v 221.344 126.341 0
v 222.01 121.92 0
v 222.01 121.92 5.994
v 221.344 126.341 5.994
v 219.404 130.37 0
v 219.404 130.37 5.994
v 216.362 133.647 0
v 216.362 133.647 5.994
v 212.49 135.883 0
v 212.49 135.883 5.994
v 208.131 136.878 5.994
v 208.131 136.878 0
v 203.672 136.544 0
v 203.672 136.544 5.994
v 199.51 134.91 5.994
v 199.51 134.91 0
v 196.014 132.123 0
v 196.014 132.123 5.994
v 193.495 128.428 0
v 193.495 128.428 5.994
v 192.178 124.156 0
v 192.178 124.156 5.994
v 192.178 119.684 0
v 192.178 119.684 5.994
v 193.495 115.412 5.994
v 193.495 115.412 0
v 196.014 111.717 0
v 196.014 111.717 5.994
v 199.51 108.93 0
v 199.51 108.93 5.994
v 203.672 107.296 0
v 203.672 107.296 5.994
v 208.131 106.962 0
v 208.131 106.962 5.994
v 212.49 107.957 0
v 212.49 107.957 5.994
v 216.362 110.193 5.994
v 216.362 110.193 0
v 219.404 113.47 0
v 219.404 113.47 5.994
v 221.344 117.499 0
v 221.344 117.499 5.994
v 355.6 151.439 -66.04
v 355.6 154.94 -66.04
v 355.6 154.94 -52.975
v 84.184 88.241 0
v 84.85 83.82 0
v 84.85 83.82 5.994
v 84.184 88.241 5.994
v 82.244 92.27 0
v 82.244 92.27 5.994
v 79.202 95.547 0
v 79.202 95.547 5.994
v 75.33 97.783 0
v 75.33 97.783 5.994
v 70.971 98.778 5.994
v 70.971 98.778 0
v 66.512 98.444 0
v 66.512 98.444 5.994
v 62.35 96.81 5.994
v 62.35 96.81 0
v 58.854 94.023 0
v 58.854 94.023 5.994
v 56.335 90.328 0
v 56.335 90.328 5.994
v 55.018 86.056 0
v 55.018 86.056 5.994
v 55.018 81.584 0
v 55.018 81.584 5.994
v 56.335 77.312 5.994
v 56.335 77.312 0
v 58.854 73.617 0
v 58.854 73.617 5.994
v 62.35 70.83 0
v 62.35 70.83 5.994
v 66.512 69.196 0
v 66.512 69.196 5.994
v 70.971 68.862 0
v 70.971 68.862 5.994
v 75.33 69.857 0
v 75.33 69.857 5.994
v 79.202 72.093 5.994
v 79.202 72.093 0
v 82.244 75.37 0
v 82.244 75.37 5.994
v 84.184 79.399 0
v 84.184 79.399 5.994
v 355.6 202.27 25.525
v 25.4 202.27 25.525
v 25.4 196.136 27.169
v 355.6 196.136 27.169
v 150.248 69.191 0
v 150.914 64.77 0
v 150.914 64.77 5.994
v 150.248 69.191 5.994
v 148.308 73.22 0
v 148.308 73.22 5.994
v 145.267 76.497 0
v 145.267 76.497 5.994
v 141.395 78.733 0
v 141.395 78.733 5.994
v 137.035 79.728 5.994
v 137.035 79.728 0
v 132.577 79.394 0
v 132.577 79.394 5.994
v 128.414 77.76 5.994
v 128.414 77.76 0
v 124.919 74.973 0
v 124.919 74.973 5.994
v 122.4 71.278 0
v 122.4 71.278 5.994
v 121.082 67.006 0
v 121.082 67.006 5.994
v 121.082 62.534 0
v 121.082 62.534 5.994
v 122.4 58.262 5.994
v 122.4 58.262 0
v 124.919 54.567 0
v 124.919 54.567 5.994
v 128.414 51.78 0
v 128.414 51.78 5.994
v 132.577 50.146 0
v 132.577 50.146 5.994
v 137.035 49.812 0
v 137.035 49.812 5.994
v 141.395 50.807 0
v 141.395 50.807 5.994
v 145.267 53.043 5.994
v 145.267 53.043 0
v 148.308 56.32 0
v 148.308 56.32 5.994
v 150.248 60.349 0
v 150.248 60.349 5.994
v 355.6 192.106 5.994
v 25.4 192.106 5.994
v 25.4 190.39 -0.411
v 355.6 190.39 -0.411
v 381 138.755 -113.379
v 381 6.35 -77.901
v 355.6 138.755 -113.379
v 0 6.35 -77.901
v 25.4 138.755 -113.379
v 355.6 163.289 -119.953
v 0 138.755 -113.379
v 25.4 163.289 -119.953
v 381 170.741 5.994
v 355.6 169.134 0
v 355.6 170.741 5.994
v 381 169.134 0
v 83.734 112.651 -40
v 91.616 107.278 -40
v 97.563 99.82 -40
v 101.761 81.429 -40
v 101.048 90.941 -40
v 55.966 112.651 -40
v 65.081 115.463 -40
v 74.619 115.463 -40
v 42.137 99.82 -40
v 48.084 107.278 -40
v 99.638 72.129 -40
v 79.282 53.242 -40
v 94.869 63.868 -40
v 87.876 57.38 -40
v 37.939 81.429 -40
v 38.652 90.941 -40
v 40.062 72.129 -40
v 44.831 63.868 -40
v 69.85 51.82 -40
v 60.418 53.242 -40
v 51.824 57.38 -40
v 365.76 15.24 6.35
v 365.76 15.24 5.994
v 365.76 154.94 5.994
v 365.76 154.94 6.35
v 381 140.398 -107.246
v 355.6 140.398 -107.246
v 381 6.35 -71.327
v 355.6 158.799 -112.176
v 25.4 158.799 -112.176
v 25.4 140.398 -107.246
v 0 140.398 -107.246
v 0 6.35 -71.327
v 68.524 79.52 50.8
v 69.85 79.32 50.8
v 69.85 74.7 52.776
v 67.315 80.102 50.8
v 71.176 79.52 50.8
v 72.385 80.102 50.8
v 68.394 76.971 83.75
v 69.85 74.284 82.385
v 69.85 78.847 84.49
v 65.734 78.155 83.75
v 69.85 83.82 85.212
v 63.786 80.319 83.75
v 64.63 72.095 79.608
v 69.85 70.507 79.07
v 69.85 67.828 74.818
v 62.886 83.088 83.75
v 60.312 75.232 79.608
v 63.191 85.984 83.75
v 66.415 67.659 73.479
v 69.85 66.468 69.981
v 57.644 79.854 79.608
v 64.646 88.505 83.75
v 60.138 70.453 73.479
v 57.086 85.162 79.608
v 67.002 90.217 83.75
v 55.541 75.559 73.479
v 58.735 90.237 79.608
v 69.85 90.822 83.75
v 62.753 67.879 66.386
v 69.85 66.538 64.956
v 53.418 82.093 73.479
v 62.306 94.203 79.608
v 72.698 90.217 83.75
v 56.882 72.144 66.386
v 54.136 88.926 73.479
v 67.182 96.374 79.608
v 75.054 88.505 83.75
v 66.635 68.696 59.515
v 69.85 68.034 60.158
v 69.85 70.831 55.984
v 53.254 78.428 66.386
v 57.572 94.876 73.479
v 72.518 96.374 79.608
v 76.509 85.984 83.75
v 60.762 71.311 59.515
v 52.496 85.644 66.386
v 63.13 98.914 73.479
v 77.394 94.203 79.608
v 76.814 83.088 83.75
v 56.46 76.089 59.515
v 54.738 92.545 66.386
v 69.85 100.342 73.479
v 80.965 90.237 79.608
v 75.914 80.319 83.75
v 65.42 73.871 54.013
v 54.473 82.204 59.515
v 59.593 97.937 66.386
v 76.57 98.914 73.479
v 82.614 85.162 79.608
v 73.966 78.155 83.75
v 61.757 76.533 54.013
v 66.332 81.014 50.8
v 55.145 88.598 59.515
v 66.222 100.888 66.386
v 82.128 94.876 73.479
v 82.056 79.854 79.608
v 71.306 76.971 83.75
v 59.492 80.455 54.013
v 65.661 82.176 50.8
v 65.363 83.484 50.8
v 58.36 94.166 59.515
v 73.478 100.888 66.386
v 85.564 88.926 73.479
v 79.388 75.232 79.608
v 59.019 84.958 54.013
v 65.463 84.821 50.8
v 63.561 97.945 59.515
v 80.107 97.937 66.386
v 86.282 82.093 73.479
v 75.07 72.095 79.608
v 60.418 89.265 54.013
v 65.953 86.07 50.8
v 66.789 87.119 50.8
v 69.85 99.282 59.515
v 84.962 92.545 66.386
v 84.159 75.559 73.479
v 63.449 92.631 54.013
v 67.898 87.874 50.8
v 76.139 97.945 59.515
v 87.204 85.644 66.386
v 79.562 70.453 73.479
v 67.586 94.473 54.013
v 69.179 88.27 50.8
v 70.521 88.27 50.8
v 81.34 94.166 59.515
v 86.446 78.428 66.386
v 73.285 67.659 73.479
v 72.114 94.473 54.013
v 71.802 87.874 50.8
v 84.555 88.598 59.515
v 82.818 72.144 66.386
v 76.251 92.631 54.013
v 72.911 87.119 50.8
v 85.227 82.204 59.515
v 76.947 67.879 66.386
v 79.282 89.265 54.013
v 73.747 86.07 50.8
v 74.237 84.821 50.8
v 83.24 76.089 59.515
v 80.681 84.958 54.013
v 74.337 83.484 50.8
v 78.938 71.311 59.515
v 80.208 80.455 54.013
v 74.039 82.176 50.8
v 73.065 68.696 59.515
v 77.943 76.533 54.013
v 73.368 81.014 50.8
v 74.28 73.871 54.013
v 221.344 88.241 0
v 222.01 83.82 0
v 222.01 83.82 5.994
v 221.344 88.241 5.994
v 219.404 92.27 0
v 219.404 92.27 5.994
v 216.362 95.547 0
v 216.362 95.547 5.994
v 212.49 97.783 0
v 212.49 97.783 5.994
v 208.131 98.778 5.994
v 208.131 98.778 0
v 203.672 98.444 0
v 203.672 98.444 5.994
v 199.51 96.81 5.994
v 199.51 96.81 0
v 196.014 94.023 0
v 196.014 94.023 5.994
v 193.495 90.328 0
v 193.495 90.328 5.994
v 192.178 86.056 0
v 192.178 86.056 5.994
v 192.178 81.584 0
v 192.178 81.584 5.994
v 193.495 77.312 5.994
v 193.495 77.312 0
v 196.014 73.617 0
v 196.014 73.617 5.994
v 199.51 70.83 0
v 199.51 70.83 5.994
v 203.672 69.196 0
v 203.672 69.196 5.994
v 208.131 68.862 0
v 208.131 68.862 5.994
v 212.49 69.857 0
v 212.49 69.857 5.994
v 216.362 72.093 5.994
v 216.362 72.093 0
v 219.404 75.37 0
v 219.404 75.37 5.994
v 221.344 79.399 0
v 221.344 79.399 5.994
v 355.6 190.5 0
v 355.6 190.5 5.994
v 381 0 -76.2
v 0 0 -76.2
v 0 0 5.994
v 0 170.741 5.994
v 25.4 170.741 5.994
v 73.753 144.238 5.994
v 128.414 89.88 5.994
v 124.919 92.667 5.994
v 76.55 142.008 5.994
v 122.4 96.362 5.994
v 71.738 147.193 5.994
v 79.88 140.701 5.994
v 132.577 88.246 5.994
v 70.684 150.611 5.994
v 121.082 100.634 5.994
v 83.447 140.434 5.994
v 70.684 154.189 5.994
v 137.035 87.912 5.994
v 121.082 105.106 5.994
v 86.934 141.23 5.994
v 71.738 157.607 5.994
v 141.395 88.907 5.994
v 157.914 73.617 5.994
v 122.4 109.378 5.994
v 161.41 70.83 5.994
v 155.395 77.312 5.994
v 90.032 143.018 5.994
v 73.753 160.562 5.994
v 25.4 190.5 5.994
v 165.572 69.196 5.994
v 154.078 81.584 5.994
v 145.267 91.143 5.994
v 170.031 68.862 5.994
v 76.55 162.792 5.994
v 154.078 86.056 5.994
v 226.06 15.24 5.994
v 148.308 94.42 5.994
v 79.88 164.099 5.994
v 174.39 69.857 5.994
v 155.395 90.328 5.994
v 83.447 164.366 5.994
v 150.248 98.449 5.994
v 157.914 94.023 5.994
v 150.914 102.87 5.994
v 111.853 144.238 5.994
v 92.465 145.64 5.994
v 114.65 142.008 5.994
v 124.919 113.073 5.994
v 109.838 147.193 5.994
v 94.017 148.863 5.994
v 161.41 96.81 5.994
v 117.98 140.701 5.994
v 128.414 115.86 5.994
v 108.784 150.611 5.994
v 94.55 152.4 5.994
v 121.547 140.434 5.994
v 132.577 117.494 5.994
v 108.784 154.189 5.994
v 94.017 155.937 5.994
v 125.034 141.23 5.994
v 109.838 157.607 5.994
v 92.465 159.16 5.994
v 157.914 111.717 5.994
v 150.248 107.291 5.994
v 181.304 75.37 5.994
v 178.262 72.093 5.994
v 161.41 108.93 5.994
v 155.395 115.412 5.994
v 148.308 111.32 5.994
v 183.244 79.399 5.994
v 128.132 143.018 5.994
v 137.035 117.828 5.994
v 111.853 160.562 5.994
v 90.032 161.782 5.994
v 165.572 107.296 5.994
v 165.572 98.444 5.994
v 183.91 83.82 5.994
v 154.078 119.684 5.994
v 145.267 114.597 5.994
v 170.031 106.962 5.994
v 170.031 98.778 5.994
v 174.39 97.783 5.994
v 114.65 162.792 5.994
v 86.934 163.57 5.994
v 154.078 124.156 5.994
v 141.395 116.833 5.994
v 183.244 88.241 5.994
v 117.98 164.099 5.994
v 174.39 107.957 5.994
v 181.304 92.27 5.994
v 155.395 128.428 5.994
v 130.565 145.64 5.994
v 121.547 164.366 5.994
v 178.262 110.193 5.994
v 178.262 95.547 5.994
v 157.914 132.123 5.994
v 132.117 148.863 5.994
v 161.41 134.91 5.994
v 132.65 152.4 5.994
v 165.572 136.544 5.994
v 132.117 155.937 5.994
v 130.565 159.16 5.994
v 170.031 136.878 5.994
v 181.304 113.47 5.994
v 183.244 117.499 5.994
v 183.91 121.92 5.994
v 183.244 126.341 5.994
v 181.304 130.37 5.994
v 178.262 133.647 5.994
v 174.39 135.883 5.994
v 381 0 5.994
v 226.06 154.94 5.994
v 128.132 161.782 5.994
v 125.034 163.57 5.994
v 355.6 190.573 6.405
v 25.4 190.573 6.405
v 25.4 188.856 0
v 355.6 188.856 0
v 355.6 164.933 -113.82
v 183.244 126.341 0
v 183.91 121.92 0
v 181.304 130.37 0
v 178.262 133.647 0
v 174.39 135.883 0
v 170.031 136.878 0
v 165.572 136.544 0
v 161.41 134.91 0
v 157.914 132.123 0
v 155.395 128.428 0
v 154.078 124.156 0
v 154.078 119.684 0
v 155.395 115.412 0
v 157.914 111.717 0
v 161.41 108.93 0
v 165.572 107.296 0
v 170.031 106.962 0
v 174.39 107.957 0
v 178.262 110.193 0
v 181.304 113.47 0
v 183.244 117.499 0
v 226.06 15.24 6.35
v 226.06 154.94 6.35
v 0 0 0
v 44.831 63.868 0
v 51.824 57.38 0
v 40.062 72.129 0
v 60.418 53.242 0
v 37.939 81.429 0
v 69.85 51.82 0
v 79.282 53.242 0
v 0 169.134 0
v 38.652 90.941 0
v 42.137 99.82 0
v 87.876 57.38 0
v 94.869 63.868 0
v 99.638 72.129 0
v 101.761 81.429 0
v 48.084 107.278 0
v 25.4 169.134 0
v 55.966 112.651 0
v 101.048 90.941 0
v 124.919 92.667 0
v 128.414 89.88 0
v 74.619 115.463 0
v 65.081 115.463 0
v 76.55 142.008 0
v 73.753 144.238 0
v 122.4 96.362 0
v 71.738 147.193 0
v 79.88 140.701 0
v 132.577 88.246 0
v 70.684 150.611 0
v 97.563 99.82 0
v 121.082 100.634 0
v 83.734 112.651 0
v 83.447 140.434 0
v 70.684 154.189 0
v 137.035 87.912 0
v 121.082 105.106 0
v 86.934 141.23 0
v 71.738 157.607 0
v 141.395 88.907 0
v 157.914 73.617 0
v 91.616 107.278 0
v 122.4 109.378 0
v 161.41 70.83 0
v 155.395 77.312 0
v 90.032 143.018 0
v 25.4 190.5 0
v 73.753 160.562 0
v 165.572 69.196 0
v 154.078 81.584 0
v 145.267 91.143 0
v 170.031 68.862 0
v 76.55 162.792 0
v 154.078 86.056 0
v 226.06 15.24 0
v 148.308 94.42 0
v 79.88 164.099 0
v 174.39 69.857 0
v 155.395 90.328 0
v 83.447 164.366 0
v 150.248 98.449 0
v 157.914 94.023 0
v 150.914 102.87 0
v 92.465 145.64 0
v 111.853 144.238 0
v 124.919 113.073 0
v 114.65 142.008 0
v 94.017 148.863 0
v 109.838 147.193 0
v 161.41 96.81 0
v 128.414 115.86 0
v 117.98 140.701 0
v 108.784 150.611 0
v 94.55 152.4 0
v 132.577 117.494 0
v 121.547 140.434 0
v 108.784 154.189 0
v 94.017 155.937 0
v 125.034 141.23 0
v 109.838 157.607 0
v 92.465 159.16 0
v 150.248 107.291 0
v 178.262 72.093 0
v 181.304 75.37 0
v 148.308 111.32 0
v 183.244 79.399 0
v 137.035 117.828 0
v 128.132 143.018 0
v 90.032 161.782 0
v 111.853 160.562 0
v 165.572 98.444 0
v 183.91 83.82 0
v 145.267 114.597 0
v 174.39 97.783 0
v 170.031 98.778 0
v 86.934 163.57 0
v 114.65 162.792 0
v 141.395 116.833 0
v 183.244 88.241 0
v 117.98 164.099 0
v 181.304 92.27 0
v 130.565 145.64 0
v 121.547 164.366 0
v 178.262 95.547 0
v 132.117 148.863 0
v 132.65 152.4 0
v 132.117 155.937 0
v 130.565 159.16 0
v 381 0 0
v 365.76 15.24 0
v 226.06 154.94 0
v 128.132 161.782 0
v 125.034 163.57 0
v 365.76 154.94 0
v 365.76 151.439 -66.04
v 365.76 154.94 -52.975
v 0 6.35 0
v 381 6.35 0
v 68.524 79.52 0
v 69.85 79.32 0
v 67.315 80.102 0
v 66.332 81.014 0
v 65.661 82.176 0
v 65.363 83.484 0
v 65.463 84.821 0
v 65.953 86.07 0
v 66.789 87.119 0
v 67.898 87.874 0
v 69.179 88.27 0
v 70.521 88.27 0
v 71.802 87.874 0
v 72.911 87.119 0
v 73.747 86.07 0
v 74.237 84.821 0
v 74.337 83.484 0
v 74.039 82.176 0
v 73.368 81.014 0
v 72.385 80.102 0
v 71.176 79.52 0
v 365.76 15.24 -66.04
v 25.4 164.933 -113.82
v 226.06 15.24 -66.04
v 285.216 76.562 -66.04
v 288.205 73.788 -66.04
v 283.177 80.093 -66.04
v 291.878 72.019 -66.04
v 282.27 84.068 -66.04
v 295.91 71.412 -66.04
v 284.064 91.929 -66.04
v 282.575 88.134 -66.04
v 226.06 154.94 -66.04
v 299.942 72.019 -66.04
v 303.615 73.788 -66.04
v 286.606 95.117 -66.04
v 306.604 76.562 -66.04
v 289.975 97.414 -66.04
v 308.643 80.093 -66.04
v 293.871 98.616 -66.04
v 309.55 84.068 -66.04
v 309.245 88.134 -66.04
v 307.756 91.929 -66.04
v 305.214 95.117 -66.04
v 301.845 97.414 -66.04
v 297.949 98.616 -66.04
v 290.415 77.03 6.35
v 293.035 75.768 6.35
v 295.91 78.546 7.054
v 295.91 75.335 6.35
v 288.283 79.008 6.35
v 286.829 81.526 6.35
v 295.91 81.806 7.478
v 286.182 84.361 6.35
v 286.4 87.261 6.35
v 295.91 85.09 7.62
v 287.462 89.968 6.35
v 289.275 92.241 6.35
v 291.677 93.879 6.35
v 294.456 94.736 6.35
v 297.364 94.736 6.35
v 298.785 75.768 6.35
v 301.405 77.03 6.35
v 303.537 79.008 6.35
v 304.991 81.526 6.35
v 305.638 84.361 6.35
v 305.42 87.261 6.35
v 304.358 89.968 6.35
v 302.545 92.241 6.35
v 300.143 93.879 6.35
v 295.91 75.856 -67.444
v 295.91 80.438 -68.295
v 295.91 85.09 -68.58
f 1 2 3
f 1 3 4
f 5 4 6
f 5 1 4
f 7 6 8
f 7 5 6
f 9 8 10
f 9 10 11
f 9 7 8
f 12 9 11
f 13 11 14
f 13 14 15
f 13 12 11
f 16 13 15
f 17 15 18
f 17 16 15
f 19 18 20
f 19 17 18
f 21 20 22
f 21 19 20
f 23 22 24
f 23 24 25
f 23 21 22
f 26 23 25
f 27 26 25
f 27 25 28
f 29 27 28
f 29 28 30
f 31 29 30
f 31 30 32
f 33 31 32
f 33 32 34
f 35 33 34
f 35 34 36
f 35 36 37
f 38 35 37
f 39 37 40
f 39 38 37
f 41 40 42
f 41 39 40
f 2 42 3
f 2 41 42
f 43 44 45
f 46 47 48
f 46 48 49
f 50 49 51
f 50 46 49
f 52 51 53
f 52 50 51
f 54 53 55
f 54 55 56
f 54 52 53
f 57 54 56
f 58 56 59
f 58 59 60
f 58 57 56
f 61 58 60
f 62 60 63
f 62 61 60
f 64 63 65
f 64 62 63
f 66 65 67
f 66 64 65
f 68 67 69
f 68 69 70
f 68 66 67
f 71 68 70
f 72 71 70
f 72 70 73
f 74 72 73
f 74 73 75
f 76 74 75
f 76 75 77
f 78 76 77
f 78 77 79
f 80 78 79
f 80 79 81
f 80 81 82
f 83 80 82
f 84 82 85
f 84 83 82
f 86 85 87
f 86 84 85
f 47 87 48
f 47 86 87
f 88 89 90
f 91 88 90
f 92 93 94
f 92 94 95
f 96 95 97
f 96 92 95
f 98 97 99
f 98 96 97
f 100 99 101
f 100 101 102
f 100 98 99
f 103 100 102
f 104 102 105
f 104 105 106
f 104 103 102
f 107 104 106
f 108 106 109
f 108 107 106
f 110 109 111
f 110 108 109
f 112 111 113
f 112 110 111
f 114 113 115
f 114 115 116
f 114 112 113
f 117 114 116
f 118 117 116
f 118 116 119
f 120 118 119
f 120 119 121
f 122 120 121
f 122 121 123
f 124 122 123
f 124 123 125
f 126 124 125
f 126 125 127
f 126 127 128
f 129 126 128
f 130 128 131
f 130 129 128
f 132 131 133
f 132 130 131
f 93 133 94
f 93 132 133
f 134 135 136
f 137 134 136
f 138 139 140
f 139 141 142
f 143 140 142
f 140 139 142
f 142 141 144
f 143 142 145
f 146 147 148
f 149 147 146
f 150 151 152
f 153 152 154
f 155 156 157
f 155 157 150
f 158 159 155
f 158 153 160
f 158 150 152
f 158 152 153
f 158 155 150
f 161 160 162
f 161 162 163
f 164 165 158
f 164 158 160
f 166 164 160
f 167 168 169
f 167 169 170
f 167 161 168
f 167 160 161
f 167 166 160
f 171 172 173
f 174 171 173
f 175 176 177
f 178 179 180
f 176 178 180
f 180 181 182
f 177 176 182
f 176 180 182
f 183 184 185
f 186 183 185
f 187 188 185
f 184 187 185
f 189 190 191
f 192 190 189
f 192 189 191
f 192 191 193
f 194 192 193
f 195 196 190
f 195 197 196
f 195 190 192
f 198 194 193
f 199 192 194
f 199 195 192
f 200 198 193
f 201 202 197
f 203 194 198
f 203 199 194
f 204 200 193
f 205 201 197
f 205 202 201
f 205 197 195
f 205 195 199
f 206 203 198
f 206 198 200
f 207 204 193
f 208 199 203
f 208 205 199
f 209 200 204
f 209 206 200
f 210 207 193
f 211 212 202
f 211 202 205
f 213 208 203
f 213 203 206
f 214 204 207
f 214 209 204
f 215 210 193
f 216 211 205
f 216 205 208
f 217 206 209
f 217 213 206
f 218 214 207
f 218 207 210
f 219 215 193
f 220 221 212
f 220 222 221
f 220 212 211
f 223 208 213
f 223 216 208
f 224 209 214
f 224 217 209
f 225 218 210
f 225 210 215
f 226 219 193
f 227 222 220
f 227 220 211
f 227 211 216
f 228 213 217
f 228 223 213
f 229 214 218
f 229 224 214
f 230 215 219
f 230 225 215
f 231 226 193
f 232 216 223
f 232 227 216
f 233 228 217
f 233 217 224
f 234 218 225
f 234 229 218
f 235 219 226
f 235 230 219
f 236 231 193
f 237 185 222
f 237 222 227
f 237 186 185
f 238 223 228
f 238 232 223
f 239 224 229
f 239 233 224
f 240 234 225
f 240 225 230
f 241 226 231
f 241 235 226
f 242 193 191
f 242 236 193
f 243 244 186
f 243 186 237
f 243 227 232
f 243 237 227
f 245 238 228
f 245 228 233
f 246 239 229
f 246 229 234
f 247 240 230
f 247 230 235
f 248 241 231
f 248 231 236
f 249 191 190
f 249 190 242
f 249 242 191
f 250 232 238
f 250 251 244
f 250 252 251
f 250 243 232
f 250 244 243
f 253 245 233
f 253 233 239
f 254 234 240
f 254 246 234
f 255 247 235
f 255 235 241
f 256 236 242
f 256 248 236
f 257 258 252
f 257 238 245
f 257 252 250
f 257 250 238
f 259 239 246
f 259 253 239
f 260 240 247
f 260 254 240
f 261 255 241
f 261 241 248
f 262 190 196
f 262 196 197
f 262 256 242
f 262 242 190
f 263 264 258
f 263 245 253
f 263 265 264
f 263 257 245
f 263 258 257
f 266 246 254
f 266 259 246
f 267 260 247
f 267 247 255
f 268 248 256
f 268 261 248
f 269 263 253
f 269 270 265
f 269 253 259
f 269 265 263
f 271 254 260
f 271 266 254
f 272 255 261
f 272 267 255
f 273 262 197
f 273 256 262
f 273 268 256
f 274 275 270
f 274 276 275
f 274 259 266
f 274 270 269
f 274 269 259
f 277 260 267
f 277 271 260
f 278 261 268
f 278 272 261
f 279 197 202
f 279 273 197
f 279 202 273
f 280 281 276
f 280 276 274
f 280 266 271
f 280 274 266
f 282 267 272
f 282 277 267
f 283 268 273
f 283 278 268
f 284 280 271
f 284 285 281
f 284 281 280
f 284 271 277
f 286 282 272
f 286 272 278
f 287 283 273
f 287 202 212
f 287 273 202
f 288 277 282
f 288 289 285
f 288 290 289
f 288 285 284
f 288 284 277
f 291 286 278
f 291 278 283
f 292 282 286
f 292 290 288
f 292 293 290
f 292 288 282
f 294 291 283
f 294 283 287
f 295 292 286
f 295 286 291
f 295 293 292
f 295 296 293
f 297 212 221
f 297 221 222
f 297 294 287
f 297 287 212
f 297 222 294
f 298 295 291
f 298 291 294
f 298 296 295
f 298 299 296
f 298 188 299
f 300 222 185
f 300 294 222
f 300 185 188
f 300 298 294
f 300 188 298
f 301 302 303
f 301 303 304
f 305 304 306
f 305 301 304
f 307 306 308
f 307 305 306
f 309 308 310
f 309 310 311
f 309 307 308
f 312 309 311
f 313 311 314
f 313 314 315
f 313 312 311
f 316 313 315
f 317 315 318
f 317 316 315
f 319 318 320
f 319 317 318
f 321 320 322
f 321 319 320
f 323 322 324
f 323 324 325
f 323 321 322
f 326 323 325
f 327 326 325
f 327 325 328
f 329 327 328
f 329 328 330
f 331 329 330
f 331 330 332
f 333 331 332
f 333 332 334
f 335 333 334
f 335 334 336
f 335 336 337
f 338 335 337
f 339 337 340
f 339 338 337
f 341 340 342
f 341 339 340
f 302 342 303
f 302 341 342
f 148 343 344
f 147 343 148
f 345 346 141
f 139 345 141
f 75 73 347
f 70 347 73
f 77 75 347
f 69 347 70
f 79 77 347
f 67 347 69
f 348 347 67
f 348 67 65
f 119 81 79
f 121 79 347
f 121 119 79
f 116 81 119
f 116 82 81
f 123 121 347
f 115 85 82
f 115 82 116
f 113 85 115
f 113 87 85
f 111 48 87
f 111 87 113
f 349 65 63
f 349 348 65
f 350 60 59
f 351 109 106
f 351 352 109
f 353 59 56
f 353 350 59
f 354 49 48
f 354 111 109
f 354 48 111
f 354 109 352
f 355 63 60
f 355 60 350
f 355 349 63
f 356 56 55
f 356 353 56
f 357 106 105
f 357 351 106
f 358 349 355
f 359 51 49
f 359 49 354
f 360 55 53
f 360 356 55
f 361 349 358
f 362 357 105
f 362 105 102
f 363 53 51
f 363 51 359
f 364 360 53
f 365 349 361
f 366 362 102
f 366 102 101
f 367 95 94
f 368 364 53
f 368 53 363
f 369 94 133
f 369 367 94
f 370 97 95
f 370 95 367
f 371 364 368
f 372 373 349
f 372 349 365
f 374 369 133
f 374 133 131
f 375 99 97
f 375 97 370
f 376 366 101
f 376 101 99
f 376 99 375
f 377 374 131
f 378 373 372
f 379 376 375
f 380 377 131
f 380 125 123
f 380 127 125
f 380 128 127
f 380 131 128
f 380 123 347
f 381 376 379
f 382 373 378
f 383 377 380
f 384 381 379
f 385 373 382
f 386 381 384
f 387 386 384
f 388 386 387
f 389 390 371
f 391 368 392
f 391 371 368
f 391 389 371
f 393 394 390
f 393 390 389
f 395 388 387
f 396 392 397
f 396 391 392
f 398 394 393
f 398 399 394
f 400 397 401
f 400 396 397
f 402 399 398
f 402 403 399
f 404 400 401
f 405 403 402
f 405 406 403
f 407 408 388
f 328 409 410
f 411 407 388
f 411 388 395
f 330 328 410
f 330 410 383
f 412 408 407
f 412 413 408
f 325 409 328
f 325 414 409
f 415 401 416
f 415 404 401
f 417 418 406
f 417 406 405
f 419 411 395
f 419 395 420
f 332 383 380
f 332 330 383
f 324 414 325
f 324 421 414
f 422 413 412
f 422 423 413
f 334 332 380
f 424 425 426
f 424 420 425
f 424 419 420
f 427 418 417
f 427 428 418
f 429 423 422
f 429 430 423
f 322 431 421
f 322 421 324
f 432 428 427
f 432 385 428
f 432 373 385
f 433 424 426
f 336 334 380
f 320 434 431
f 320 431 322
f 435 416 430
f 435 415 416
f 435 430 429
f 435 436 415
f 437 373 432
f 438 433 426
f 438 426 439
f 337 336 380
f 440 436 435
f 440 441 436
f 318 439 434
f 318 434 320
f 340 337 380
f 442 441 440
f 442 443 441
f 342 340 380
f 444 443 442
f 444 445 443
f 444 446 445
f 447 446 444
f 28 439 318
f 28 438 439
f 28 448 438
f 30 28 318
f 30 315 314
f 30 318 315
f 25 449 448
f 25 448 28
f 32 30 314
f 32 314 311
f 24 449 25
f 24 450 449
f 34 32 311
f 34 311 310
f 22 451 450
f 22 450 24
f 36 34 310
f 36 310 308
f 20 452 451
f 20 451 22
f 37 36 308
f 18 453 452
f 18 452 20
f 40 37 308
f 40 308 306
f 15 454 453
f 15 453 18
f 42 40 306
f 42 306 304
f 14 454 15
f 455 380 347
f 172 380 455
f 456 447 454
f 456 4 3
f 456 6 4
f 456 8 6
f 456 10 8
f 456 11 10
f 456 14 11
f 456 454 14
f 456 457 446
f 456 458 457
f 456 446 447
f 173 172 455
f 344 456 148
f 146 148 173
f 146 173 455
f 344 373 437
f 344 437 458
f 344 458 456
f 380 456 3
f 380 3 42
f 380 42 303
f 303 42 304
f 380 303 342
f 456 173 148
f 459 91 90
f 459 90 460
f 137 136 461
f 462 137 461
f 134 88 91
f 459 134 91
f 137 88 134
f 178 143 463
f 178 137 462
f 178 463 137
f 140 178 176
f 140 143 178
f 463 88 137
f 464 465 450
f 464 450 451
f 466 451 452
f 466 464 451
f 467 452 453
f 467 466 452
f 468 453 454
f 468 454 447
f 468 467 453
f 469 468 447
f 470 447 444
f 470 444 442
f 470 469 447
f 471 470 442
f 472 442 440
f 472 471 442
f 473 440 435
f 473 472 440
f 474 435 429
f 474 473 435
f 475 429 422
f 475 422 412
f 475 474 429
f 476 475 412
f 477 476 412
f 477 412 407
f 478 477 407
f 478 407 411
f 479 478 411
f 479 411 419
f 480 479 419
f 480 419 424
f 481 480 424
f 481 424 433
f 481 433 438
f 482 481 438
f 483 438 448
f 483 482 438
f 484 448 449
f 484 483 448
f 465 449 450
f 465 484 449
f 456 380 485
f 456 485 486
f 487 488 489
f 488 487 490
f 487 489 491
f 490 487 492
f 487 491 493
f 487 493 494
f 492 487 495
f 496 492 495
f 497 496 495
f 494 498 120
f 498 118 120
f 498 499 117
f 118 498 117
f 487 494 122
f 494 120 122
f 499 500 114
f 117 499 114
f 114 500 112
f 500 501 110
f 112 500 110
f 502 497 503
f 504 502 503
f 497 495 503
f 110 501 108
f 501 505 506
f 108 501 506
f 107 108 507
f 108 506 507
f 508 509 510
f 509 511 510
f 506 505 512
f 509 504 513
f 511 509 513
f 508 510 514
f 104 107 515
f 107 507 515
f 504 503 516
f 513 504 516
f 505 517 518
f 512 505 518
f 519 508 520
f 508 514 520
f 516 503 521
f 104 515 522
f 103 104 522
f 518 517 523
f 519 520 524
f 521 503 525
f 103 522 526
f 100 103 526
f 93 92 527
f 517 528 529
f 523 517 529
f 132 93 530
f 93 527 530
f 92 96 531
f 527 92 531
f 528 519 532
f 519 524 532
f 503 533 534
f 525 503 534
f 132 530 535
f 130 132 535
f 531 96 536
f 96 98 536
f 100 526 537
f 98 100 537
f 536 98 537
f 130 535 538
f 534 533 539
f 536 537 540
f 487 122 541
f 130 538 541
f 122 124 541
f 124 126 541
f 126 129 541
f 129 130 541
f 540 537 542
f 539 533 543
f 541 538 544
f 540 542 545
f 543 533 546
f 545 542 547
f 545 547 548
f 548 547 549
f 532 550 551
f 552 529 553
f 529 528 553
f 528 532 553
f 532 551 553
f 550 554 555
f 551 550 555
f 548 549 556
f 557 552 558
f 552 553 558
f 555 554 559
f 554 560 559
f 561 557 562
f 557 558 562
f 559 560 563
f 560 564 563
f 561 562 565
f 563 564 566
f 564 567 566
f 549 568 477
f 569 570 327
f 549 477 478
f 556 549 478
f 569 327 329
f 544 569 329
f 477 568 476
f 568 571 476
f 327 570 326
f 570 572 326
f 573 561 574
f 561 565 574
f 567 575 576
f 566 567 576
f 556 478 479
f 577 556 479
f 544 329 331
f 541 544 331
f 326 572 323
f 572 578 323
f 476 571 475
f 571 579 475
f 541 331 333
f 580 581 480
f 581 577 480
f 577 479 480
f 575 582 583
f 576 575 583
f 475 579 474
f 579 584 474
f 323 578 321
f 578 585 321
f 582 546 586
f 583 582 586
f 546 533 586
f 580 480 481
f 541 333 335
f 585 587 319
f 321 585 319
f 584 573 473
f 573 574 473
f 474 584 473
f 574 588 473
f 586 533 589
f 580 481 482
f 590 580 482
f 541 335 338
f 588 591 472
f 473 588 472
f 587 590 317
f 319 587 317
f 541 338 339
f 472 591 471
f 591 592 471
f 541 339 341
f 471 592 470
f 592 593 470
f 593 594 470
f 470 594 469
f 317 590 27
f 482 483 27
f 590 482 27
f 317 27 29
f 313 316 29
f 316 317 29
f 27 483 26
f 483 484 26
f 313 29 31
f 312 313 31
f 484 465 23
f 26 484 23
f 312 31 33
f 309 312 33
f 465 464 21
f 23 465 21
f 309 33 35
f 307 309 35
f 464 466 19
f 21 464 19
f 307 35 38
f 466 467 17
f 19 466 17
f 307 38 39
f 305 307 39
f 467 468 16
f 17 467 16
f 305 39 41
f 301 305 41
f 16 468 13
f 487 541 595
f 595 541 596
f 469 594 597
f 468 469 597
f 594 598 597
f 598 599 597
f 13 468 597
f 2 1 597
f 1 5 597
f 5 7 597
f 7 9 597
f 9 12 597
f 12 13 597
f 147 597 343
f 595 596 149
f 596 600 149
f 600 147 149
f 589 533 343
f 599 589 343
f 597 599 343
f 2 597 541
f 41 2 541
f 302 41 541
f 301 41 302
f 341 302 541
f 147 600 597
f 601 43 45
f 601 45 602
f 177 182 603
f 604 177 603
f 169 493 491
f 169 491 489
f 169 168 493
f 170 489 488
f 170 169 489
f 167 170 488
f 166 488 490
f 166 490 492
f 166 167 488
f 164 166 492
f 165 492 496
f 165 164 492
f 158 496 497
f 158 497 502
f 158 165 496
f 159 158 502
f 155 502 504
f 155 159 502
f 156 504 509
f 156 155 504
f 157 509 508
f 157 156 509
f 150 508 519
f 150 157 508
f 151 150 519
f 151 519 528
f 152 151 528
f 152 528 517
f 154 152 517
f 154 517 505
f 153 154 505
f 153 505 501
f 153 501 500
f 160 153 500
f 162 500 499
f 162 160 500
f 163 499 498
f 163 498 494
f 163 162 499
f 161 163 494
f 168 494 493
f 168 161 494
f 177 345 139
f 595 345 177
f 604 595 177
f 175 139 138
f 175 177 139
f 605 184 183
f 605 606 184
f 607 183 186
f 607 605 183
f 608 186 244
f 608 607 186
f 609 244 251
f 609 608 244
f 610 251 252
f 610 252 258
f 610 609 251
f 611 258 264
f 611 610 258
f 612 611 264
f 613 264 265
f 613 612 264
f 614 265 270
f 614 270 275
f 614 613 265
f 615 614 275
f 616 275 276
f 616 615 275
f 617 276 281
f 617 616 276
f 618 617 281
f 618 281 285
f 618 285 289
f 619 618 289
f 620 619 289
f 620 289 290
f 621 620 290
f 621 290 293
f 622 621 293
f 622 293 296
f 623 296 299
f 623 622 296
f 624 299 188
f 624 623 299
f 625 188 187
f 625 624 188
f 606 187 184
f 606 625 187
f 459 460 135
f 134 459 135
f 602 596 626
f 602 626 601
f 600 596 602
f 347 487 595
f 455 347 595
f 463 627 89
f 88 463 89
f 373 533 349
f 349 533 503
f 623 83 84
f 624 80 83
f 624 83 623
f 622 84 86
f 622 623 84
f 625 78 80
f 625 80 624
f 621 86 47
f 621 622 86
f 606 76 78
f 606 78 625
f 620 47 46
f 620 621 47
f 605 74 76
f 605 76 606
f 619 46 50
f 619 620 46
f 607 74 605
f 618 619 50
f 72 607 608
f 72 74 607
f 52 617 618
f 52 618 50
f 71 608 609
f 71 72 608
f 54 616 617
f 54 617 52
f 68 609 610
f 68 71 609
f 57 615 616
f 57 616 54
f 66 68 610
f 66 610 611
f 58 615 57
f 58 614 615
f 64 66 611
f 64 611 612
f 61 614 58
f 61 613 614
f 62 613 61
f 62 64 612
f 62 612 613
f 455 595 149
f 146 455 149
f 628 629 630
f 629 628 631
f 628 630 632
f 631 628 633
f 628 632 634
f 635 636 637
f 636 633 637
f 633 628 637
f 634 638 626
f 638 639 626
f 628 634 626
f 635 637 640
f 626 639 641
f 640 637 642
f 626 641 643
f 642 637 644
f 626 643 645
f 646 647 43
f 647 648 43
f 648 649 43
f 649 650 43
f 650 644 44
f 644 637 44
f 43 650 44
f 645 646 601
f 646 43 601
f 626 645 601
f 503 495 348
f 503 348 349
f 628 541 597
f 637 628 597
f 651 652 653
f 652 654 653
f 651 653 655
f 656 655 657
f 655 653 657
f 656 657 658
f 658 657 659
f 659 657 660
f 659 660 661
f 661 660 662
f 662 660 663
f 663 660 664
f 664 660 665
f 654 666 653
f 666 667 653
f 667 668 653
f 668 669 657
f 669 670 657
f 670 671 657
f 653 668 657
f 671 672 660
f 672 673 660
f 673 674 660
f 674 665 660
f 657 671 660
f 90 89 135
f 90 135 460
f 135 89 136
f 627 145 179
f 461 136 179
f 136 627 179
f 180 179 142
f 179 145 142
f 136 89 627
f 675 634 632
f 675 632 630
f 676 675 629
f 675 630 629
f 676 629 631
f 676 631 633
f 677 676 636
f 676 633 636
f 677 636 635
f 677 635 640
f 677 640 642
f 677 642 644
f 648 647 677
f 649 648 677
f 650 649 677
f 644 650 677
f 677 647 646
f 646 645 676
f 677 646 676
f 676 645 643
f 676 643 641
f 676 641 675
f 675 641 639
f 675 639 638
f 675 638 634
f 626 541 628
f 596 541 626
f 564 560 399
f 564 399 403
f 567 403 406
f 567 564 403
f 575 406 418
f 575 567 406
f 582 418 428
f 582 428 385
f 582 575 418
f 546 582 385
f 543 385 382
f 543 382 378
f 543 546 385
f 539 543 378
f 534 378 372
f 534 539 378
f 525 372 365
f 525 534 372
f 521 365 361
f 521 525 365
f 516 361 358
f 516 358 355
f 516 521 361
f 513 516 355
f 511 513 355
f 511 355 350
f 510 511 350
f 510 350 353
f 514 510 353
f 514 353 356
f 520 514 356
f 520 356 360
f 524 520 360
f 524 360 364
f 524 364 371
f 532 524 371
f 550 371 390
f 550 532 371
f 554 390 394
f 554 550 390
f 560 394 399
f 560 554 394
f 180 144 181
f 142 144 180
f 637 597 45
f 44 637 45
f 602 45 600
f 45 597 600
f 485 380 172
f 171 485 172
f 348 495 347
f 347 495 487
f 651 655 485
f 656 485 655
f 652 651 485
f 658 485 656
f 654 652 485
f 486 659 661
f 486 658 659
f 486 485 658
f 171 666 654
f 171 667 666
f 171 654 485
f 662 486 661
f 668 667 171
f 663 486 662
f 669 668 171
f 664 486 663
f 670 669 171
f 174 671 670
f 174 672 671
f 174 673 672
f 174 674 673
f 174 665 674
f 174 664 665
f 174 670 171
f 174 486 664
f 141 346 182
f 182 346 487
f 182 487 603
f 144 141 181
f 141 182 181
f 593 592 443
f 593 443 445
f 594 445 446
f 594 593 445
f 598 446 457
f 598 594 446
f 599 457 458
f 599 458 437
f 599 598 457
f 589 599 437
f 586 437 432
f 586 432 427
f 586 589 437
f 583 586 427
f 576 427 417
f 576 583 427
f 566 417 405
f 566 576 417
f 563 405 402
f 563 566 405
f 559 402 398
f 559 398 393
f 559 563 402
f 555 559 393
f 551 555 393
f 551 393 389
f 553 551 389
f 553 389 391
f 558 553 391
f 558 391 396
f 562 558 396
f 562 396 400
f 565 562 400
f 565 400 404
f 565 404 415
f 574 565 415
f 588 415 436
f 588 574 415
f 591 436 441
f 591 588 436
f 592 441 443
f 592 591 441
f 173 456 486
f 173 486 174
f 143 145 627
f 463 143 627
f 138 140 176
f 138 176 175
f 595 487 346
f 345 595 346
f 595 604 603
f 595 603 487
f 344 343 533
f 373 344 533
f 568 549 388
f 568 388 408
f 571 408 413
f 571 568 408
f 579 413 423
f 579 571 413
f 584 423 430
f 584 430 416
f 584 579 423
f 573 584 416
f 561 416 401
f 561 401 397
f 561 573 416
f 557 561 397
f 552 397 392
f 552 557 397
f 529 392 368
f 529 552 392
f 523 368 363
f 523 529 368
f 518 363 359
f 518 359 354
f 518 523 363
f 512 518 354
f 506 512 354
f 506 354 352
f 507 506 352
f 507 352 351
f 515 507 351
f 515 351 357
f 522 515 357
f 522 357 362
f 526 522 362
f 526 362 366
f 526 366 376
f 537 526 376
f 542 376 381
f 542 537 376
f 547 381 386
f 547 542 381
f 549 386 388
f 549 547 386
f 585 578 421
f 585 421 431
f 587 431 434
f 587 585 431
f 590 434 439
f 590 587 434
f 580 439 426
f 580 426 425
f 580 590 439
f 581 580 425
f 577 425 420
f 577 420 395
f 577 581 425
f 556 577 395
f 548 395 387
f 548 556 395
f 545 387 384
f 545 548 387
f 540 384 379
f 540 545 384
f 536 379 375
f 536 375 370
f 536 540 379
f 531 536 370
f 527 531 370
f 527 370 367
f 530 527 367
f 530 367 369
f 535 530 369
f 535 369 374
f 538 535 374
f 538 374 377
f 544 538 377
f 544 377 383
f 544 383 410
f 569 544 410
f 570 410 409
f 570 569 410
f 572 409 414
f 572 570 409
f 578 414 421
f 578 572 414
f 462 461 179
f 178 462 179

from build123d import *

# Parameters (mm, degrees)
F2_R           = 15
F2_W           = 139.7
F2_H           = 139.7
F2_R_2         = 12
F3_DEPTH       = 5.9944
F13_DEPTH      = 66.04
F13_DEPTH_BACK = 6.35
F15_DEPTH      = 381
F16_W          = 25.4
F16_H          = 25.4
F17_DEPTH      = 203.2


with BuildPart() as f3:
    # F2 (on Top) → F3 (new body)
    with BuildSketch(Plane.XY):
        Polygon((0, 171.45), (0, 0), (381, 0), (381, 171.45), (361.95, 171.45), (361.95, 190.5), (19.05, 190.5), (19.05, 171.45), align=None)
        with Locations((69.85, 83.82)):
            Circle(F2_R, mode=Mode.SUBTRACT)
        with Locations((135.9144321158, 64.77)):
            Circle(F2_R, mode=Mode.SUBTRACT)
        with Locations((168.91, 83.82)):
            Circle(F2_R, mode=Mode.SUBTRACT)
        with Locations((207.01, 83.82)):
            Circle(F2_R, mode=Mode.SUBTRACT)
        with Locations((295.91, 85.09)):
            Rectangle(F2_W, F2_H, mode=Mode.SUBTRACT)
        with Locations((135.9144321158, 102.87)):
            Circle(F2_R, mode=Mode.SUBTRACT)
        with Locations((168.91, 121.92)):
            Circle(F2_R, mode=Mode.SUBTRACT)
        with Locations((82.55, 152.4)):
            Circle(F2_R_2, mode=Mode.SUBTRACT)
        with Locations((120.65, 152.4)):
            Circle(F2_R_2, mode=Mode.SUBTRACT)
        with Locations((207.01, 121.92)):
            Circle(F2_R, mode=Mode.SUBTRACT)
    extrude(amount=F3_DEPTH)

    # F9 (on offset) → F10 (revolve)
    with BuildSketch(Plane.YZ.offset(69.85)):
        with BuildLine():
            Line((83.82, -40), (83.82, 85.2115345253))
            ThreePointArc((83.82, 85.2115345253), (66.4677400003, 69.980691396), (79.32, 50.8))
            Line((79.32, 50.8), (79.32, 0))
            Line((79.32, 0), (51.82, 0))
            Line((51.82, 0), (51.82, -40))
            Line((51.82, -40), (83.82, -40))
        make_face()
    revolve(axis=Axis((69.85, 83.82, 22.6057672626), (0, 0, -1)))



with BuildPart() as f12:
    # F11 (on 3pt) → F12 (revolve)
    with BuildSketch(Plane(origin=(295.91, 0, 0), x_dir=(0, -1, 0), z_dir=(-1, 0, 0))):
        with BuildLine():
            Line((-85.09, 7.62), (-85.09, -68.58))
            ThreePointArc((-85.09, -68.58), (-46.99, -30.48), (-85.09, 7.62))
        make_face()
    revolve(axis=Axis((295.91, 85.09, -30.48), (0, 0, -1)))


with BuildPart() as f3_1:
    add(f3.part)

    add(f12.part)  # F13 merges F12
    # F2 (on Top) → F13 (join, two sides)
    with BuildSketch(Plane.XY) as f13_sk:
        with Locations((295.91, 85.09)):
            Rectangle(F2_W, F2_H)
    extrude(amount=-F13_DEPTH)
    extrude(f13_sk.sketch, amount=F13_DEPTH_BACK)


with BuildPart() as f15:
    # F14 (on Right) → F15 (new body)
    with BuildSketch(Plane.YZ):
        Polygon((188.8564990636, 0), (158.7990133976, -112.1760636532), (164.9326423946, -113.8195645896), (202.2700196956, 25.5254245194), (196.1363906987, 27.1689254558), (190.5727873899, 6.4052752341), (192.1061946391, 5.9944), (190.3899063128, -0.4108752341), align=None)
        Polygon((6.35, -71.3274736263), (6.35, -77.9014773719), (163.2891414582, -119.9531935865), (164.9326423946, -113.8195645896), (158.7990133976, -112.1760636532), align=None)
        Polygon((6.35, 0), (0, 0), (0, -76.2), (6.35, -77.9014773719), (6.35, -71.3274736263), align=None)
    extrude(amount=F15_DEPTH)


with BuildPart() as f17_tool:
    # F16 (on face) → F17 (new body)
    with BuildSketch(Plane(origin=(0, -19.05, -71.0955678842), x_dir=(1, 0, 0), z_dir=(0, -0.2588190451, -0.9659258263))):
        with Locations((368.3, -176.0713699081)):
            Rectangle(F16_W, F16_H)
        with Locations((12.7, -176.0713699081)):
            Rectangle(F16_W, F16_H)
    extrude(amount=-F17_DEPTH)


with BuildPart() as f3_2:
    add(f3_1.part)

    # F17: cut by f17_tool
    add(f17_tool.part, mode=Mode.SUBTRACT)


with BuildPart() as f15_1:
    add(f15.part)

    # F17: cut by f17_tool
    add(f17_tool.part, mode=Mode.SUBTRACT)


solid = Compound([f3_2.part, f15_1.part])
